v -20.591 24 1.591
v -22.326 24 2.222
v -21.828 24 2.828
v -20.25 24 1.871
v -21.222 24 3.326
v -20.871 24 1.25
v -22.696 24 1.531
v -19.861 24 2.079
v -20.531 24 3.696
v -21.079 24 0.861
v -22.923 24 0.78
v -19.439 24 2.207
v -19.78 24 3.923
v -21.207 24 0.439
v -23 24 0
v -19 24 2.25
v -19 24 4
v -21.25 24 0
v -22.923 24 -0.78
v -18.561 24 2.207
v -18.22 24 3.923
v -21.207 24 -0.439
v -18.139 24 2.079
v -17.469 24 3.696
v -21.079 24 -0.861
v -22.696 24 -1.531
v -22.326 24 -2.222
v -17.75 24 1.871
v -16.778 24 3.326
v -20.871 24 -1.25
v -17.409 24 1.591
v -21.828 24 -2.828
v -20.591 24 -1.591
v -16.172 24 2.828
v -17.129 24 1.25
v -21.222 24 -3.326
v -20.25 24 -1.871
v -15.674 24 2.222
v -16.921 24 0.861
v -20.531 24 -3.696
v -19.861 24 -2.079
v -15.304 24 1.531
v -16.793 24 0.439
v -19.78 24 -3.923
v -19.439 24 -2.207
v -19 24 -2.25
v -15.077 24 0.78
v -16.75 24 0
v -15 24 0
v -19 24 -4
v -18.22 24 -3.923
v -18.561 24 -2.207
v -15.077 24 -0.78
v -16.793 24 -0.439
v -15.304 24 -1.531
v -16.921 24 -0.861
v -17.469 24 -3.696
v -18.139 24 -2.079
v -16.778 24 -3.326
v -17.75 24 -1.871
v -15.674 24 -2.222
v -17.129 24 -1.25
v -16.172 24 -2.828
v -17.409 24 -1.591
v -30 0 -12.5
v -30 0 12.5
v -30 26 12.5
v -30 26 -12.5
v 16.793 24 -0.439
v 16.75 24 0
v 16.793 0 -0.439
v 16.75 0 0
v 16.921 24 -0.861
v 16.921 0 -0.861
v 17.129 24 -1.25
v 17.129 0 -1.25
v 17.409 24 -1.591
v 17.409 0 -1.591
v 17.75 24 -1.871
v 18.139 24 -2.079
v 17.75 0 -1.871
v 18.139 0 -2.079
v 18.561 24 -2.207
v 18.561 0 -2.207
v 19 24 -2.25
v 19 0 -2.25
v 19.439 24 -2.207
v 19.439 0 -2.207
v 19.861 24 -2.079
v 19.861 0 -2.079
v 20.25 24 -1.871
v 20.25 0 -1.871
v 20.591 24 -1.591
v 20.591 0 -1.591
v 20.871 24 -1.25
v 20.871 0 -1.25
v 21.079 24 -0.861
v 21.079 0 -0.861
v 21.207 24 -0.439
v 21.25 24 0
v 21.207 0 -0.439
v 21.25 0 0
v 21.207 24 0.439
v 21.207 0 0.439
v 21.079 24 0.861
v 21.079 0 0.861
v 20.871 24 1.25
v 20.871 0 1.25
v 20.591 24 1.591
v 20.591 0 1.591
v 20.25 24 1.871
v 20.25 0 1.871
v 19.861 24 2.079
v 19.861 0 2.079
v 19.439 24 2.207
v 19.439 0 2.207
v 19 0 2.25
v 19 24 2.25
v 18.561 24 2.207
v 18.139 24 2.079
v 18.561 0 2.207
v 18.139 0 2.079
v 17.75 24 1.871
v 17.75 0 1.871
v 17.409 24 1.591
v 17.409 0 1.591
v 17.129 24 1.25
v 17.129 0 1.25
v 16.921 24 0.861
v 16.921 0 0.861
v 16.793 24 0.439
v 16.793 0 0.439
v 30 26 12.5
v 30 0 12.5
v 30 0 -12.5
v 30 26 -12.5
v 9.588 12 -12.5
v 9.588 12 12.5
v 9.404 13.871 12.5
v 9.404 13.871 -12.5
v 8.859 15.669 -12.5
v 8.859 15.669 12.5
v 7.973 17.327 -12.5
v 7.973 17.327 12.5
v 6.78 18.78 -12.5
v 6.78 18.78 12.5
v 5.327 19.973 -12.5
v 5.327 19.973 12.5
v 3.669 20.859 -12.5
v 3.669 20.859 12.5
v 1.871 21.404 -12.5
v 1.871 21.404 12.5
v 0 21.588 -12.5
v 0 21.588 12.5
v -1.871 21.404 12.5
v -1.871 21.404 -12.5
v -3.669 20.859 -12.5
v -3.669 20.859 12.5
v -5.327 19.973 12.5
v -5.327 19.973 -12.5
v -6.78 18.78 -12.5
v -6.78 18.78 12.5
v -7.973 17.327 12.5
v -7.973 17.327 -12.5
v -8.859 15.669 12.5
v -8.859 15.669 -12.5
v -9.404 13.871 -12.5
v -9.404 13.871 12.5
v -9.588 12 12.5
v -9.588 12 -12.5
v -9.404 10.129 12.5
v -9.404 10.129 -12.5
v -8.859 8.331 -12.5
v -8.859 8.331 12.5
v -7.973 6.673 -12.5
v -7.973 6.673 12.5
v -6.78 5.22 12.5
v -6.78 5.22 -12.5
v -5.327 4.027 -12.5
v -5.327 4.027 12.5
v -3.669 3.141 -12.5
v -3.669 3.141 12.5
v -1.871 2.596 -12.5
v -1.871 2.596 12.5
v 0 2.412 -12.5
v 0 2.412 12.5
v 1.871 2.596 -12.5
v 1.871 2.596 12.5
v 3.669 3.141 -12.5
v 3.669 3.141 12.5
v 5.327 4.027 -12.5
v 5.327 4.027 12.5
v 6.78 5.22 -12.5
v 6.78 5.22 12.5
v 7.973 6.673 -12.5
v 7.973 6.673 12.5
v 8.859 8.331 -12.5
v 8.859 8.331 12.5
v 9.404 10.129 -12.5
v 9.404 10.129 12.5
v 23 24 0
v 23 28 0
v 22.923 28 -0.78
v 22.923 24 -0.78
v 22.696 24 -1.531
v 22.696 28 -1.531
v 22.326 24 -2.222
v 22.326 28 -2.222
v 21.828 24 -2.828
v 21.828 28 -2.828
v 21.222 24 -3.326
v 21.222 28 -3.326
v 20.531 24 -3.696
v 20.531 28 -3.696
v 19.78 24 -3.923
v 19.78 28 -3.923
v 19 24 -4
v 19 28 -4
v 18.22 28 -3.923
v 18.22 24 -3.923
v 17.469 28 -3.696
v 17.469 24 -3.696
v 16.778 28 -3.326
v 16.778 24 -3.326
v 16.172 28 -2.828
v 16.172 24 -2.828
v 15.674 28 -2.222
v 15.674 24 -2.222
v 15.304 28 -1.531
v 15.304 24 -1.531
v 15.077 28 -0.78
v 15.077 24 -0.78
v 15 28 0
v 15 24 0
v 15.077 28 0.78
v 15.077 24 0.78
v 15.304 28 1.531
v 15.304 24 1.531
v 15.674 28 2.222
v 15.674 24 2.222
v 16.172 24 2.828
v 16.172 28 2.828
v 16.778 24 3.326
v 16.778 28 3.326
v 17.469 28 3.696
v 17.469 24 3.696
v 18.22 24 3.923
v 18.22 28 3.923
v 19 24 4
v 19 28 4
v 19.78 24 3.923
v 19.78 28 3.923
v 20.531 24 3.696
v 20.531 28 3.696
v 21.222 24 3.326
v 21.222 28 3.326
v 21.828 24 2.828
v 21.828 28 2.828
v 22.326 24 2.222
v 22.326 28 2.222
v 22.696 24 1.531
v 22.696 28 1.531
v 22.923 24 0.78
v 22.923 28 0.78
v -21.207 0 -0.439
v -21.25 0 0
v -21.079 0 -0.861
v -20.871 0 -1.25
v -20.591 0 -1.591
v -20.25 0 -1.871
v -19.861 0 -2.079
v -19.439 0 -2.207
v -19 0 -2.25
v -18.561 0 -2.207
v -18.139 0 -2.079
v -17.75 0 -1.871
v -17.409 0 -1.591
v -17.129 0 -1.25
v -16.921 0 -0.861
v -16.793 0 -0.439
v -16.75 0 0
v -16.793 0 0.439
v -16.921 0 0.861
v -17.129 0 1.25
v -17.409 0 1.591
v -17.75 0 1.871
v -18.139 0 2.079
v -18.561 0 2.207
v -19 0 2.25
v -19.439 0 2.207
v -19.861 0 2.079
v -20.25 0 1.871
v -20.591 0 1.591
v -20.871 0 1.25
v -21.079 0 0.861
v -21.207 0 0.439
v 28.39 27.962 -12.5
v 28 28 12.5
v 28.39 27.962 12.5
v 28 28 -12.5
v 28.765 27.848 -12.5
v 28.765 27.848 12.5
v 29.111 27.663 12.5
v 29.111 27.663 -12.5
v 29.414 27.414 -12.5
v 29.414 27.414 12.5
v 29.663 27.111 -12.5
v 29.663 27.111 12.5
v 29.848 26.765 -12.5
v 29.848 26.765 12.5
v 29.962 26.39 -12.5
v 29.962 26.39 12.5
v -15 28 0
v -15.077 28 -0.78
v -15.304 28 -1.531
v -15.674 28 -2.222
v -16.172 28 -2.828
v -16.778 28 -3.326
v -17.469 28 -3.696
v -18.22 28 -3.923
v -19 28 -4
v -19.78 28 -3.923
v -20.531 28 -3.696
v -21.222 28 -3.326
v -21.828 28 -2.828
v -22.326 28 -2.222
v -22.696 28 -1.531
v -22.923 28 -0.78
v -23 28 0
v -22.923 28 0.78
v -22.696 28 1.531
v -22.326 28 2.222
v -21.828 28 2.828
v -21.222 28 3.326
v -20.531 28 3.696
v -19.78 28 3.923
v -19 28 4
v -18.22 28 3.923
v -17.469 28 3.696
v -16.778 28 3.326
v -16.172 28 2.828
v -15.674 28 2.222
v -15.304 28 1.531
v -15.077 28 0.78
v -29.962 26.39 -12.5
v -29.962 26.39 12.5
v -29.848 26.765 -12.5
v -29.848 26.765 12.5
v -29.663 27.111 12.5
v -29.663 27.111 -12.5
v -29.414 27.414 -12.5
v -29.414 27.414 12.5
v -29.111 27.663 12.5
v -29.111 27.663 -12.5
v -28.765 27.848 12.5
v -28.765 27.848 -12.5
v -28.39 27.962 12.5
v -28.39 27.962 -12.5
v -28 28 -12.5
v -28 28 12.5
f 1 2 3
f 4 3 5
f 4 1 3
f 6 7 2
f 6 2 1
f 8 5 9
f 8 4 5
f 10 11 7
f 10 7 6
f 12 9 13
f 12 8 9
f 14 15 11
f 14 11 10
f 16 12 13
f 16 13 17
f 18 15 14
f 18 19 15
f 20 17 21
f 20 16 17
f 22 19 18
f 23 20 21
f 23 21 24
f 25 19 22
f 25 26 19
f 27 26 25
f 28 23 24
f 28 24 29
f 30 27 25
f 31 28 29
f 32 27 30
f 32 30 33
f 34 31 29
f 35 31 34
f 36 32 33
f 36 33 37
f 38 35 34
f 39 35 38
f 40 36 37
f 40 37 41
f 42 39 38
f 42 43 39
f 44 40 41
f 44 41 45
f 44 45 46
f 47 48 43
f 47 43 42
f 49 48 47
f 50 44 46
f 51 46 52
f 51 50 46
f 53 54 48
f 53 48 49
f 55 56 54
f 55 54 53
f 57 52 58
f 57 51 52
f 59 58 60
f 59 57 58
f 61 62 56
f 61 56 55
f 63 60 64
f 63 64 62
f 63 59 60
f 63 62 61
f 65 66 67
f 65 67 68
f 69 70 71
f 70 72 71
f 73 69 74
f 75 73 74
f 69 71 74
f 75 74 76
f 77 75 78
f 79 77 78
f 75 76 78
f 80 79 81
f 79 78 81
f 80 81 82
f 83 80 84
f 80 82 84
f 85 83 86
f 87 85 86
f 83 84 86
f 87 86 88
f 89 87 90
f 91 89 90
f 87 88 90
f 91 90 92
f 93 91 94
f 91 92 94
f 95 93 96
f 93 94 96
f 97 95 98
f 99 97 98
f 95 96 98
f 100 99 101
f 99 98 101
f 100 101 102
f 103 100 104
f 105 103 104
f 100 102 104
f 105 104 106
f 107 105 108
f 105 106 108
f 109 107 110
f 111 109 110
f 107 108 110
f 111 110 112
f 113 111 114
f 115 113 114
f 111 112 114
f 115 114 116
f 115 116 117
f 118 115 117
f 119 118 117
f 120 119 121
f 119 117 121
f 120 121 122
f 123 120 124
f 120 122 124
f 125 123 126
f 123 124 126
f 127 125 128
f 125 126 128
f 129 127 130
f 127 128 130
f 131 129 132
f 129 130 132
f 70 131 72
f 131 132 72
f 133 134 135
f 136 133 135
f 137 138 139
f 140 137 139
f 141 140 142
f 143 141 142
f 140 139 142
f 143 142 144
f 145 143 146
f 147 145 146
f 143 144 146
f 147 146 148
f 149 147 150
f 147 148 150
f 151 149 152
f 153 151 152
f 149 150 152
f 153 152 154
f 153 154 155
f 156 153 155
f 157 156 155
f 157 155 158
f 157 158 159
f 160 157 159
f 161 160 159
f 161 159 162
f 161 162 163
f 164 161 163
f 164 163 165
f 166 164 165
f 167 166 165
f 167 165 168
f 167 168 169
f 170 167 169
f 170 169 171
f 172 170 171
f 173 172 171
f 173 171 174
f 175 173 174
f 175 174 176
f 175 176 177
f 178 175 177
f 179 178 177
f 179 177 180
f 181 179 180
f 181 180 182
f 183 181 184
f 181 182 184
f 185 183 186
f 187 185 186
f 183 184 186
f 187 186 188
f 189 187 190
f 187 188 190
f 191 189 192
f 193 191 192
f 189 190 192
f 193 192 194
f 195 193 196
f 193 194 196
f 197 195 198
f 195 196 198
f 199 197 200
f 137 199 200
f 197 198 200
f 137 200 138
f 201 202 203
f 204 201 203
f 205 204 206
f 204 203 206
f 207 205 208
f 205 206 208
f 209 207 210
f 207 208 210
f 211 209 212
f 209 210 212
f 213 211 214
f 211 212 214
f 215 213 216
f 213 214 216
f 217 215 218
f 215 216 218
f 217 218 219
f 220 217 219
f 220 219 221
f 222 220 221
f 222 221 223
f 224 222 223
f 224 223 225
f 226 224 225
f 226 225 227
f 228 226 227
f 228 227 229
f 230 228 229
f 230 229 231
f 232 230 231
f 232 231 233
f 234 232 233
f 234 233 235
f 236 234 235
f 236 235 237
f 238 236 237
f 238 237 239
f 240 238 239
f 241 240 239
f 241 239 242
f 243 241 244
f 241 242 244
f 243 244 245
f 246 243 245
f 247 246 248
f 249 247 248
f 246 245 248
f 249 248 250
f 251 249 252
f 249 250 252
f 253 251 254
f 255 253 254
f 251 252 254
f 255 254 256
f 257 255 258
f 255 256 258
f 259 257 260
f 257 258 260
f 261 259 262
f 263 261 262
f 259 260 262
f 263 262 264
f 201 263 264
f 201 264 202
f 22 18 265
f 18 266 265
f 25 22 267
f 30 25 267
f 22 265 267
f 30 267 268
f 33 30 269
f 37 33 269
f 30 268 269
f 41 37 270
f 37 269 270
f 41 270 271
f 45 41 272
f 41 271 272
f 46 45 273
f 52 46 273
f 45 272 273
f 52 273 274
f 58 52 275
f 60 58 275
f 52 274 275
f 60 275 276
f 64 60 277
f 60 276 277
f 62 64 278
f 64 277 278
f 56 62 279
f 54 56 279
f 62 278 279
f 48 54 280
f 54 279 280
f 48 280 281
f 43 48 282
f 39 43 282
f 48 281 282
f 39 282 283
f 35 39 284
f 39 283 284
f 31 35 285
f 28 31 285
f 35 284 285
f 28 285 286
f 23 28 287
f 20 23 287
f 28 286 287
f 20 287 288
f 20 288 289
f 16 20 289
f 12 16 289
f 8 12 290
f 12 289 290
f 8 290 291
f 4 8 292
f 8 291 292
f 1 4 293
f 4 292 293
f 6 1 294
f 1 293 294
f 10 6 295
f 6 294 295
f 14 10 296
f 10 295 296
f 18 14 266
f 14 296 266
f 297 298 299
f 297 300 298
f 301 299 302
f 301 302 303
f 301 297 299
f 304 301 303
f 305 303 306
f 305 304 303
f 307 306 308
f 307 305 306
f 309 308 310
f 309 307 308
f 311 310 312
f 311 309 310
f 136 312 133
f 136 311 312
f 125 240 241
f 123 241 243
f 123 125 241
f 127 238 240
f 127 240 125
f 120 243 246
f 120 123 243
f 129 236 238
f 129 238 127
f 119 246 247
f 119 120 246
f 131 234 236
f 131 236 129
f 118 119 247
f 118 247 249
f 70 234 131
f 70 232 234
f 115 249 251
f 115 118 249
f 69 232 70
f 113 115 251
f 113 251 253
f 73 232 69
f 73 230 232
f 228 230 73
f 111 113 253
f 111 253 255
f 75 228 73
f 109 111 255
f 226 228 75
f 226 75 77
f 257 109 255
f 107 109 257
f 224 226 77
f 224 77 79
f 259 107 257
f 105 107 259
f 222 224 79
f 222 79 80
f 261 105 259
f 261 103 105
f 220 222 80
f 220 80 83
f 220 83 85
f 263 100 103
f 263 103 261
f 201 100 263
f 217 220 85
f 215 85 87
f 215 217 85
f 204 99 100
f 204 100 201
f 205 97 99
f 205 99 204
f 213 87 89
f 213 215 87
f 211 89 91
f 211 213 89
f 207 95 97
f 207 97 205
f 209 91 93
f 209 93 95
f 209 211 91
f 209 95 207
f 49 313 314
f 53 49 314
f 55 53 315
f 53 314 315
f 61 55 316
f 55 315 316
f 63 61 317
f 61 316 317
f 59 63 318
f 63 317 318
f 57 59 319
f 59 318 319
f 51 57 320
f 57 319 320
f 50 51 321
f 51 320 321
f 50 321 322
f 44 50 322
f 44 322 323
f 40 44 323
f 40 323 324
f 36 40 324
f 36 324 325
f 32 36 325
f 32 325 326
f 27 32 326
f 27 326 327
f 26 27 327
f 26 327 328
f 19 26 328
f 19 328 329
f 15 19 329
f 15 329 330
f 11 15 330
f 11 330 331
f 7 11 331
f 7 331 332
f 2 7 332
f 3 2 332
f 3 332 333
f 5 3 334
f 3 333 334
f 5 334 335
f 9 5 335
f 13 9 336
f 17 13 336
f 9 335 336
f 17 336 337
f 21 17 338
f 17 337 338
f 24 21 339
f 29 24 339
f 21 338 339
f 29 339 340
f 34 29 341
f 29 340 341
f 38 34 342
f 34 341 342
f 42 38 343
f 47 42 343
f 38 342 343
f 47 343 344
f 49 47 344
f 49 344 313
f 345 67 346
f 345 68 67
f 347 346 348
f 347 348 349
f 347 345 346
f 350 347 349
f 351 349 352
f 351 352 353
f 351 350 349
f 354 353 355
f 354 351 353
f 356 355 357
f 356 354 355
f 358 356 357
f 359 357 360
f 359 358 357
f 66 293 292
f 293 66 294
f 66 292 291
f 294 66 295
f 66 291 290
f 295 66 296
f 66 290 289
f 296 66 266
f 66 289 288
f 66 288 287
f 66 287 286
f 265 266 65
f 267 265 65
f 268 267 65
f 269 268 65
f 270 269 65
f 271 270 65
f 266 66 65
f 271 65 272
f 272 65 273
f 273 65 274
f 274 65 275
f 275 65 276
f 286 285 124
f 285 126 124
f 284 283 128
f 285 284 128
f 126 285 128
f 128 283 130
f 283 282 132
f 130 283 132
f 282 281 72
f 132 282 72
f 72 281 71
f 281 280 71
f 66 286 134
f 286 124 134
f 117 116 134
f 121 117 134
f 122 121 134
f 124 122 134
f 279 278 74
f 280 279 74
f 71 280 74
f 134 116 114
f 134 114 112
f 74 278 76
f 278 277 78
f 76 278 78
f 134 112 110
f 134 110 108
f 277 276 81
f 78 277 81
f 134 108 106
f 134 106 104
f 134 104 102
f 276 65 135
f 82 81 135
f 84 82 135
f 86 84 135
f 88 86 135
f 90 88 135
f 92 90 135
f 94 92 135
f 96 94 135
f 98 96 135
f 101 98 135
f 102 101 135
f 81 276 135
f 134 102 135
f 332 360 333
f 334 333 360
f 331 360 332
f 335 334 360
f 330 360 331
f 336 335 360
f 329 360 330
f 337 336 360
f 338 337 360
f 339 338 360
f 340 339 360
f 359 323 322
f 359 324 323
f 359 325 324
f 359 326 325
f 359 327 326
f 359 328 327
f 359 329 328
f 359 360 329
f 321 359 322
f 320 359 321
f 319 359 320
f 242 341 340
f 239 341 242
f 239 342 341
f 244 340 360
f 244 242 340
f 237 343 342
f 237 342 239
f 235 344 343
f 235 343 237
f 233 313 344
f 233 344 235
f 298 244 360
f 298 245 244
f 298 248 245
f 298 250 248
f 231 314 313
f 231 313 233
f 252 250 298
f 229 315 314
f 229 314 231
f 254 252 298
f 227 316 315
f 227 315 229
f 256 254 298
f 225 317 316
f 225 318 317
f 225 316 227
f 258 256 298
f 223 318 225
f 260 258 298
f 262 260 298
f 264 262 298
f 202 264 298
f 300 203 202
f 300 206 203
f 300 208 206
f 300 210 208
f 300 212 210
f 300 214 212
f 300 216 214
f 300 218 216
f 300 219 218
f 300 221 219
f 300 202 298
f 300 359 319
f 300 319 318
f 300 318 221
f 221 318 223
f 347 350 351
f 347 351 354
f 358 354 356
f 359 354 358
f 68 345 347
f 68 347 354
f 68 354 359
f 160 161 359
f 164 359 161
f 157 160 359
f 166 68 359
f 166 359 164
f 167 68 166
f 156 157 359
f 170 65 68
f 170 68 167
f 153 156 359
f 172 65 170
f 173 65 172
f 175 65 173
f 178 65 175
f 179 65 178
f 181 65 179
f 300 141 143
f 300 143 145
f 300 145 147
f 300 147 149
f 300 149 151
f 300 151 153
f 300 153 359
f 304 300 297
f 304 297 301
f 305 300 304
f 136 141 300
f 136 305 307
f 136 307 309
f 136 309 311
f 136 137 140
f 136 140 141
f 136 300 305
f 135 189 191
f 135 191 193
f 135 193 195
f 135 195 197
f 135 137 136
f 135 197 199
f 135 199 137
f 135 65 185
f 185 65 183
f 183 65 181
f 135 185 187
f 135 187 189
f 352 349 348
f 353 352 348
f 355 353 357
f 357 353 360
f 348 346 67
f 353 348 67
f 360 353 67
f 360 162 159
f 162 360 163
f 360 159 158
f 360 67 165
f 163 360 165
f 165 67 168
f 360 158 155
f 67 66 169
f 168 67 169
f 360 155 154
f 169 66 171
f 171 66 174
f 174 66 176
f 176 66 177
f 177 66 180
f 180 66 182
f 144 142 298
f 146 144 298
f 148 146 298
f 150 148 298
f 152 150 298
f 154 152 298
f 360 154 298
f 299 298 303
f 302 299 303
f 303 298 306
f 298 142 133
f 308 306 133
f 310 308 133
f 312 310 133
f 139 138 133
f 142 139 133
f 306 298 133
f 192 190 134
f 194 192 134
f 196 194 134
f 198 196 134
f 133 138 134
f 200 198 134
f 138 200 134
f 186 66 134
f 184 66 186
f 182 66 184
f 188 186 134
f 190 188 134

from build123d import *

# Parameters (mm, degrees)
SKETCH1_W                      = 60
SKETCH1_H                      = 25
BOSS_EXTRUDE1_DEPTH            = 28
SKETCH2_R                      = 9.5885
CUT_EXTRUDE1_DEPTH             = 26
CBORE_FOR_M4_SHCS1_D           = 4.5
CBORE_FOR_M4_SHCS1_CBORE_D     = 8
CBORE_FOR_M4_SHCS1_CBORE_DEPTH = 4
FILLET1_R                      = 2


with BuildPart() as part:
    # Sketch1 → Boss-Extrude1 (new body)
    with BuildSketch(Plane(origin=(0, 0, 0), x_dir=(1, 0, 0), z_dir=(0, 1, 0))):
        Rectangle(SKETCH1_W, SKETCH1_H)
    extrude(amount=BOSS_EXTRUDE1_DEPTH)

    # Sketch2 → Cut-Extrude1 (cut, through all)
    with BuildSketch(Plane.XY.offset(12.5)):
        with Locations((0, 12)):
            Circle(SKETCH2_R)
    extrude(amount=-CUT_EXTRUDE1_DEPTH, mode=Mode.SUBTRACT)

    # CBORE for M4 SHCS1 (through all)
    with Locations(Plane(origin=(0, 28, 0), x_dir=(1, 0, 0), z_dir=(0, 1, 0))):
        with Locations((-19, 0), (19, 0)):
            CounterBoreHole(CBORE_FOR_M4_SHCS1_D / 2, CBORE_FOR_M4_SHCS1_CBORE_D / 2, CBORE_FOR_M4_SHCS1_CBORE_DEPTH)

    # Fillet1
    fillet1_edges = [part.edges().sort_by_distance(p)[0] for p in [
        (-30, 28, 0),
        (30, 28, 0),
    ]]
    fillet(fillet1_edges, radius=FILLET1_R)


solid = part.part
